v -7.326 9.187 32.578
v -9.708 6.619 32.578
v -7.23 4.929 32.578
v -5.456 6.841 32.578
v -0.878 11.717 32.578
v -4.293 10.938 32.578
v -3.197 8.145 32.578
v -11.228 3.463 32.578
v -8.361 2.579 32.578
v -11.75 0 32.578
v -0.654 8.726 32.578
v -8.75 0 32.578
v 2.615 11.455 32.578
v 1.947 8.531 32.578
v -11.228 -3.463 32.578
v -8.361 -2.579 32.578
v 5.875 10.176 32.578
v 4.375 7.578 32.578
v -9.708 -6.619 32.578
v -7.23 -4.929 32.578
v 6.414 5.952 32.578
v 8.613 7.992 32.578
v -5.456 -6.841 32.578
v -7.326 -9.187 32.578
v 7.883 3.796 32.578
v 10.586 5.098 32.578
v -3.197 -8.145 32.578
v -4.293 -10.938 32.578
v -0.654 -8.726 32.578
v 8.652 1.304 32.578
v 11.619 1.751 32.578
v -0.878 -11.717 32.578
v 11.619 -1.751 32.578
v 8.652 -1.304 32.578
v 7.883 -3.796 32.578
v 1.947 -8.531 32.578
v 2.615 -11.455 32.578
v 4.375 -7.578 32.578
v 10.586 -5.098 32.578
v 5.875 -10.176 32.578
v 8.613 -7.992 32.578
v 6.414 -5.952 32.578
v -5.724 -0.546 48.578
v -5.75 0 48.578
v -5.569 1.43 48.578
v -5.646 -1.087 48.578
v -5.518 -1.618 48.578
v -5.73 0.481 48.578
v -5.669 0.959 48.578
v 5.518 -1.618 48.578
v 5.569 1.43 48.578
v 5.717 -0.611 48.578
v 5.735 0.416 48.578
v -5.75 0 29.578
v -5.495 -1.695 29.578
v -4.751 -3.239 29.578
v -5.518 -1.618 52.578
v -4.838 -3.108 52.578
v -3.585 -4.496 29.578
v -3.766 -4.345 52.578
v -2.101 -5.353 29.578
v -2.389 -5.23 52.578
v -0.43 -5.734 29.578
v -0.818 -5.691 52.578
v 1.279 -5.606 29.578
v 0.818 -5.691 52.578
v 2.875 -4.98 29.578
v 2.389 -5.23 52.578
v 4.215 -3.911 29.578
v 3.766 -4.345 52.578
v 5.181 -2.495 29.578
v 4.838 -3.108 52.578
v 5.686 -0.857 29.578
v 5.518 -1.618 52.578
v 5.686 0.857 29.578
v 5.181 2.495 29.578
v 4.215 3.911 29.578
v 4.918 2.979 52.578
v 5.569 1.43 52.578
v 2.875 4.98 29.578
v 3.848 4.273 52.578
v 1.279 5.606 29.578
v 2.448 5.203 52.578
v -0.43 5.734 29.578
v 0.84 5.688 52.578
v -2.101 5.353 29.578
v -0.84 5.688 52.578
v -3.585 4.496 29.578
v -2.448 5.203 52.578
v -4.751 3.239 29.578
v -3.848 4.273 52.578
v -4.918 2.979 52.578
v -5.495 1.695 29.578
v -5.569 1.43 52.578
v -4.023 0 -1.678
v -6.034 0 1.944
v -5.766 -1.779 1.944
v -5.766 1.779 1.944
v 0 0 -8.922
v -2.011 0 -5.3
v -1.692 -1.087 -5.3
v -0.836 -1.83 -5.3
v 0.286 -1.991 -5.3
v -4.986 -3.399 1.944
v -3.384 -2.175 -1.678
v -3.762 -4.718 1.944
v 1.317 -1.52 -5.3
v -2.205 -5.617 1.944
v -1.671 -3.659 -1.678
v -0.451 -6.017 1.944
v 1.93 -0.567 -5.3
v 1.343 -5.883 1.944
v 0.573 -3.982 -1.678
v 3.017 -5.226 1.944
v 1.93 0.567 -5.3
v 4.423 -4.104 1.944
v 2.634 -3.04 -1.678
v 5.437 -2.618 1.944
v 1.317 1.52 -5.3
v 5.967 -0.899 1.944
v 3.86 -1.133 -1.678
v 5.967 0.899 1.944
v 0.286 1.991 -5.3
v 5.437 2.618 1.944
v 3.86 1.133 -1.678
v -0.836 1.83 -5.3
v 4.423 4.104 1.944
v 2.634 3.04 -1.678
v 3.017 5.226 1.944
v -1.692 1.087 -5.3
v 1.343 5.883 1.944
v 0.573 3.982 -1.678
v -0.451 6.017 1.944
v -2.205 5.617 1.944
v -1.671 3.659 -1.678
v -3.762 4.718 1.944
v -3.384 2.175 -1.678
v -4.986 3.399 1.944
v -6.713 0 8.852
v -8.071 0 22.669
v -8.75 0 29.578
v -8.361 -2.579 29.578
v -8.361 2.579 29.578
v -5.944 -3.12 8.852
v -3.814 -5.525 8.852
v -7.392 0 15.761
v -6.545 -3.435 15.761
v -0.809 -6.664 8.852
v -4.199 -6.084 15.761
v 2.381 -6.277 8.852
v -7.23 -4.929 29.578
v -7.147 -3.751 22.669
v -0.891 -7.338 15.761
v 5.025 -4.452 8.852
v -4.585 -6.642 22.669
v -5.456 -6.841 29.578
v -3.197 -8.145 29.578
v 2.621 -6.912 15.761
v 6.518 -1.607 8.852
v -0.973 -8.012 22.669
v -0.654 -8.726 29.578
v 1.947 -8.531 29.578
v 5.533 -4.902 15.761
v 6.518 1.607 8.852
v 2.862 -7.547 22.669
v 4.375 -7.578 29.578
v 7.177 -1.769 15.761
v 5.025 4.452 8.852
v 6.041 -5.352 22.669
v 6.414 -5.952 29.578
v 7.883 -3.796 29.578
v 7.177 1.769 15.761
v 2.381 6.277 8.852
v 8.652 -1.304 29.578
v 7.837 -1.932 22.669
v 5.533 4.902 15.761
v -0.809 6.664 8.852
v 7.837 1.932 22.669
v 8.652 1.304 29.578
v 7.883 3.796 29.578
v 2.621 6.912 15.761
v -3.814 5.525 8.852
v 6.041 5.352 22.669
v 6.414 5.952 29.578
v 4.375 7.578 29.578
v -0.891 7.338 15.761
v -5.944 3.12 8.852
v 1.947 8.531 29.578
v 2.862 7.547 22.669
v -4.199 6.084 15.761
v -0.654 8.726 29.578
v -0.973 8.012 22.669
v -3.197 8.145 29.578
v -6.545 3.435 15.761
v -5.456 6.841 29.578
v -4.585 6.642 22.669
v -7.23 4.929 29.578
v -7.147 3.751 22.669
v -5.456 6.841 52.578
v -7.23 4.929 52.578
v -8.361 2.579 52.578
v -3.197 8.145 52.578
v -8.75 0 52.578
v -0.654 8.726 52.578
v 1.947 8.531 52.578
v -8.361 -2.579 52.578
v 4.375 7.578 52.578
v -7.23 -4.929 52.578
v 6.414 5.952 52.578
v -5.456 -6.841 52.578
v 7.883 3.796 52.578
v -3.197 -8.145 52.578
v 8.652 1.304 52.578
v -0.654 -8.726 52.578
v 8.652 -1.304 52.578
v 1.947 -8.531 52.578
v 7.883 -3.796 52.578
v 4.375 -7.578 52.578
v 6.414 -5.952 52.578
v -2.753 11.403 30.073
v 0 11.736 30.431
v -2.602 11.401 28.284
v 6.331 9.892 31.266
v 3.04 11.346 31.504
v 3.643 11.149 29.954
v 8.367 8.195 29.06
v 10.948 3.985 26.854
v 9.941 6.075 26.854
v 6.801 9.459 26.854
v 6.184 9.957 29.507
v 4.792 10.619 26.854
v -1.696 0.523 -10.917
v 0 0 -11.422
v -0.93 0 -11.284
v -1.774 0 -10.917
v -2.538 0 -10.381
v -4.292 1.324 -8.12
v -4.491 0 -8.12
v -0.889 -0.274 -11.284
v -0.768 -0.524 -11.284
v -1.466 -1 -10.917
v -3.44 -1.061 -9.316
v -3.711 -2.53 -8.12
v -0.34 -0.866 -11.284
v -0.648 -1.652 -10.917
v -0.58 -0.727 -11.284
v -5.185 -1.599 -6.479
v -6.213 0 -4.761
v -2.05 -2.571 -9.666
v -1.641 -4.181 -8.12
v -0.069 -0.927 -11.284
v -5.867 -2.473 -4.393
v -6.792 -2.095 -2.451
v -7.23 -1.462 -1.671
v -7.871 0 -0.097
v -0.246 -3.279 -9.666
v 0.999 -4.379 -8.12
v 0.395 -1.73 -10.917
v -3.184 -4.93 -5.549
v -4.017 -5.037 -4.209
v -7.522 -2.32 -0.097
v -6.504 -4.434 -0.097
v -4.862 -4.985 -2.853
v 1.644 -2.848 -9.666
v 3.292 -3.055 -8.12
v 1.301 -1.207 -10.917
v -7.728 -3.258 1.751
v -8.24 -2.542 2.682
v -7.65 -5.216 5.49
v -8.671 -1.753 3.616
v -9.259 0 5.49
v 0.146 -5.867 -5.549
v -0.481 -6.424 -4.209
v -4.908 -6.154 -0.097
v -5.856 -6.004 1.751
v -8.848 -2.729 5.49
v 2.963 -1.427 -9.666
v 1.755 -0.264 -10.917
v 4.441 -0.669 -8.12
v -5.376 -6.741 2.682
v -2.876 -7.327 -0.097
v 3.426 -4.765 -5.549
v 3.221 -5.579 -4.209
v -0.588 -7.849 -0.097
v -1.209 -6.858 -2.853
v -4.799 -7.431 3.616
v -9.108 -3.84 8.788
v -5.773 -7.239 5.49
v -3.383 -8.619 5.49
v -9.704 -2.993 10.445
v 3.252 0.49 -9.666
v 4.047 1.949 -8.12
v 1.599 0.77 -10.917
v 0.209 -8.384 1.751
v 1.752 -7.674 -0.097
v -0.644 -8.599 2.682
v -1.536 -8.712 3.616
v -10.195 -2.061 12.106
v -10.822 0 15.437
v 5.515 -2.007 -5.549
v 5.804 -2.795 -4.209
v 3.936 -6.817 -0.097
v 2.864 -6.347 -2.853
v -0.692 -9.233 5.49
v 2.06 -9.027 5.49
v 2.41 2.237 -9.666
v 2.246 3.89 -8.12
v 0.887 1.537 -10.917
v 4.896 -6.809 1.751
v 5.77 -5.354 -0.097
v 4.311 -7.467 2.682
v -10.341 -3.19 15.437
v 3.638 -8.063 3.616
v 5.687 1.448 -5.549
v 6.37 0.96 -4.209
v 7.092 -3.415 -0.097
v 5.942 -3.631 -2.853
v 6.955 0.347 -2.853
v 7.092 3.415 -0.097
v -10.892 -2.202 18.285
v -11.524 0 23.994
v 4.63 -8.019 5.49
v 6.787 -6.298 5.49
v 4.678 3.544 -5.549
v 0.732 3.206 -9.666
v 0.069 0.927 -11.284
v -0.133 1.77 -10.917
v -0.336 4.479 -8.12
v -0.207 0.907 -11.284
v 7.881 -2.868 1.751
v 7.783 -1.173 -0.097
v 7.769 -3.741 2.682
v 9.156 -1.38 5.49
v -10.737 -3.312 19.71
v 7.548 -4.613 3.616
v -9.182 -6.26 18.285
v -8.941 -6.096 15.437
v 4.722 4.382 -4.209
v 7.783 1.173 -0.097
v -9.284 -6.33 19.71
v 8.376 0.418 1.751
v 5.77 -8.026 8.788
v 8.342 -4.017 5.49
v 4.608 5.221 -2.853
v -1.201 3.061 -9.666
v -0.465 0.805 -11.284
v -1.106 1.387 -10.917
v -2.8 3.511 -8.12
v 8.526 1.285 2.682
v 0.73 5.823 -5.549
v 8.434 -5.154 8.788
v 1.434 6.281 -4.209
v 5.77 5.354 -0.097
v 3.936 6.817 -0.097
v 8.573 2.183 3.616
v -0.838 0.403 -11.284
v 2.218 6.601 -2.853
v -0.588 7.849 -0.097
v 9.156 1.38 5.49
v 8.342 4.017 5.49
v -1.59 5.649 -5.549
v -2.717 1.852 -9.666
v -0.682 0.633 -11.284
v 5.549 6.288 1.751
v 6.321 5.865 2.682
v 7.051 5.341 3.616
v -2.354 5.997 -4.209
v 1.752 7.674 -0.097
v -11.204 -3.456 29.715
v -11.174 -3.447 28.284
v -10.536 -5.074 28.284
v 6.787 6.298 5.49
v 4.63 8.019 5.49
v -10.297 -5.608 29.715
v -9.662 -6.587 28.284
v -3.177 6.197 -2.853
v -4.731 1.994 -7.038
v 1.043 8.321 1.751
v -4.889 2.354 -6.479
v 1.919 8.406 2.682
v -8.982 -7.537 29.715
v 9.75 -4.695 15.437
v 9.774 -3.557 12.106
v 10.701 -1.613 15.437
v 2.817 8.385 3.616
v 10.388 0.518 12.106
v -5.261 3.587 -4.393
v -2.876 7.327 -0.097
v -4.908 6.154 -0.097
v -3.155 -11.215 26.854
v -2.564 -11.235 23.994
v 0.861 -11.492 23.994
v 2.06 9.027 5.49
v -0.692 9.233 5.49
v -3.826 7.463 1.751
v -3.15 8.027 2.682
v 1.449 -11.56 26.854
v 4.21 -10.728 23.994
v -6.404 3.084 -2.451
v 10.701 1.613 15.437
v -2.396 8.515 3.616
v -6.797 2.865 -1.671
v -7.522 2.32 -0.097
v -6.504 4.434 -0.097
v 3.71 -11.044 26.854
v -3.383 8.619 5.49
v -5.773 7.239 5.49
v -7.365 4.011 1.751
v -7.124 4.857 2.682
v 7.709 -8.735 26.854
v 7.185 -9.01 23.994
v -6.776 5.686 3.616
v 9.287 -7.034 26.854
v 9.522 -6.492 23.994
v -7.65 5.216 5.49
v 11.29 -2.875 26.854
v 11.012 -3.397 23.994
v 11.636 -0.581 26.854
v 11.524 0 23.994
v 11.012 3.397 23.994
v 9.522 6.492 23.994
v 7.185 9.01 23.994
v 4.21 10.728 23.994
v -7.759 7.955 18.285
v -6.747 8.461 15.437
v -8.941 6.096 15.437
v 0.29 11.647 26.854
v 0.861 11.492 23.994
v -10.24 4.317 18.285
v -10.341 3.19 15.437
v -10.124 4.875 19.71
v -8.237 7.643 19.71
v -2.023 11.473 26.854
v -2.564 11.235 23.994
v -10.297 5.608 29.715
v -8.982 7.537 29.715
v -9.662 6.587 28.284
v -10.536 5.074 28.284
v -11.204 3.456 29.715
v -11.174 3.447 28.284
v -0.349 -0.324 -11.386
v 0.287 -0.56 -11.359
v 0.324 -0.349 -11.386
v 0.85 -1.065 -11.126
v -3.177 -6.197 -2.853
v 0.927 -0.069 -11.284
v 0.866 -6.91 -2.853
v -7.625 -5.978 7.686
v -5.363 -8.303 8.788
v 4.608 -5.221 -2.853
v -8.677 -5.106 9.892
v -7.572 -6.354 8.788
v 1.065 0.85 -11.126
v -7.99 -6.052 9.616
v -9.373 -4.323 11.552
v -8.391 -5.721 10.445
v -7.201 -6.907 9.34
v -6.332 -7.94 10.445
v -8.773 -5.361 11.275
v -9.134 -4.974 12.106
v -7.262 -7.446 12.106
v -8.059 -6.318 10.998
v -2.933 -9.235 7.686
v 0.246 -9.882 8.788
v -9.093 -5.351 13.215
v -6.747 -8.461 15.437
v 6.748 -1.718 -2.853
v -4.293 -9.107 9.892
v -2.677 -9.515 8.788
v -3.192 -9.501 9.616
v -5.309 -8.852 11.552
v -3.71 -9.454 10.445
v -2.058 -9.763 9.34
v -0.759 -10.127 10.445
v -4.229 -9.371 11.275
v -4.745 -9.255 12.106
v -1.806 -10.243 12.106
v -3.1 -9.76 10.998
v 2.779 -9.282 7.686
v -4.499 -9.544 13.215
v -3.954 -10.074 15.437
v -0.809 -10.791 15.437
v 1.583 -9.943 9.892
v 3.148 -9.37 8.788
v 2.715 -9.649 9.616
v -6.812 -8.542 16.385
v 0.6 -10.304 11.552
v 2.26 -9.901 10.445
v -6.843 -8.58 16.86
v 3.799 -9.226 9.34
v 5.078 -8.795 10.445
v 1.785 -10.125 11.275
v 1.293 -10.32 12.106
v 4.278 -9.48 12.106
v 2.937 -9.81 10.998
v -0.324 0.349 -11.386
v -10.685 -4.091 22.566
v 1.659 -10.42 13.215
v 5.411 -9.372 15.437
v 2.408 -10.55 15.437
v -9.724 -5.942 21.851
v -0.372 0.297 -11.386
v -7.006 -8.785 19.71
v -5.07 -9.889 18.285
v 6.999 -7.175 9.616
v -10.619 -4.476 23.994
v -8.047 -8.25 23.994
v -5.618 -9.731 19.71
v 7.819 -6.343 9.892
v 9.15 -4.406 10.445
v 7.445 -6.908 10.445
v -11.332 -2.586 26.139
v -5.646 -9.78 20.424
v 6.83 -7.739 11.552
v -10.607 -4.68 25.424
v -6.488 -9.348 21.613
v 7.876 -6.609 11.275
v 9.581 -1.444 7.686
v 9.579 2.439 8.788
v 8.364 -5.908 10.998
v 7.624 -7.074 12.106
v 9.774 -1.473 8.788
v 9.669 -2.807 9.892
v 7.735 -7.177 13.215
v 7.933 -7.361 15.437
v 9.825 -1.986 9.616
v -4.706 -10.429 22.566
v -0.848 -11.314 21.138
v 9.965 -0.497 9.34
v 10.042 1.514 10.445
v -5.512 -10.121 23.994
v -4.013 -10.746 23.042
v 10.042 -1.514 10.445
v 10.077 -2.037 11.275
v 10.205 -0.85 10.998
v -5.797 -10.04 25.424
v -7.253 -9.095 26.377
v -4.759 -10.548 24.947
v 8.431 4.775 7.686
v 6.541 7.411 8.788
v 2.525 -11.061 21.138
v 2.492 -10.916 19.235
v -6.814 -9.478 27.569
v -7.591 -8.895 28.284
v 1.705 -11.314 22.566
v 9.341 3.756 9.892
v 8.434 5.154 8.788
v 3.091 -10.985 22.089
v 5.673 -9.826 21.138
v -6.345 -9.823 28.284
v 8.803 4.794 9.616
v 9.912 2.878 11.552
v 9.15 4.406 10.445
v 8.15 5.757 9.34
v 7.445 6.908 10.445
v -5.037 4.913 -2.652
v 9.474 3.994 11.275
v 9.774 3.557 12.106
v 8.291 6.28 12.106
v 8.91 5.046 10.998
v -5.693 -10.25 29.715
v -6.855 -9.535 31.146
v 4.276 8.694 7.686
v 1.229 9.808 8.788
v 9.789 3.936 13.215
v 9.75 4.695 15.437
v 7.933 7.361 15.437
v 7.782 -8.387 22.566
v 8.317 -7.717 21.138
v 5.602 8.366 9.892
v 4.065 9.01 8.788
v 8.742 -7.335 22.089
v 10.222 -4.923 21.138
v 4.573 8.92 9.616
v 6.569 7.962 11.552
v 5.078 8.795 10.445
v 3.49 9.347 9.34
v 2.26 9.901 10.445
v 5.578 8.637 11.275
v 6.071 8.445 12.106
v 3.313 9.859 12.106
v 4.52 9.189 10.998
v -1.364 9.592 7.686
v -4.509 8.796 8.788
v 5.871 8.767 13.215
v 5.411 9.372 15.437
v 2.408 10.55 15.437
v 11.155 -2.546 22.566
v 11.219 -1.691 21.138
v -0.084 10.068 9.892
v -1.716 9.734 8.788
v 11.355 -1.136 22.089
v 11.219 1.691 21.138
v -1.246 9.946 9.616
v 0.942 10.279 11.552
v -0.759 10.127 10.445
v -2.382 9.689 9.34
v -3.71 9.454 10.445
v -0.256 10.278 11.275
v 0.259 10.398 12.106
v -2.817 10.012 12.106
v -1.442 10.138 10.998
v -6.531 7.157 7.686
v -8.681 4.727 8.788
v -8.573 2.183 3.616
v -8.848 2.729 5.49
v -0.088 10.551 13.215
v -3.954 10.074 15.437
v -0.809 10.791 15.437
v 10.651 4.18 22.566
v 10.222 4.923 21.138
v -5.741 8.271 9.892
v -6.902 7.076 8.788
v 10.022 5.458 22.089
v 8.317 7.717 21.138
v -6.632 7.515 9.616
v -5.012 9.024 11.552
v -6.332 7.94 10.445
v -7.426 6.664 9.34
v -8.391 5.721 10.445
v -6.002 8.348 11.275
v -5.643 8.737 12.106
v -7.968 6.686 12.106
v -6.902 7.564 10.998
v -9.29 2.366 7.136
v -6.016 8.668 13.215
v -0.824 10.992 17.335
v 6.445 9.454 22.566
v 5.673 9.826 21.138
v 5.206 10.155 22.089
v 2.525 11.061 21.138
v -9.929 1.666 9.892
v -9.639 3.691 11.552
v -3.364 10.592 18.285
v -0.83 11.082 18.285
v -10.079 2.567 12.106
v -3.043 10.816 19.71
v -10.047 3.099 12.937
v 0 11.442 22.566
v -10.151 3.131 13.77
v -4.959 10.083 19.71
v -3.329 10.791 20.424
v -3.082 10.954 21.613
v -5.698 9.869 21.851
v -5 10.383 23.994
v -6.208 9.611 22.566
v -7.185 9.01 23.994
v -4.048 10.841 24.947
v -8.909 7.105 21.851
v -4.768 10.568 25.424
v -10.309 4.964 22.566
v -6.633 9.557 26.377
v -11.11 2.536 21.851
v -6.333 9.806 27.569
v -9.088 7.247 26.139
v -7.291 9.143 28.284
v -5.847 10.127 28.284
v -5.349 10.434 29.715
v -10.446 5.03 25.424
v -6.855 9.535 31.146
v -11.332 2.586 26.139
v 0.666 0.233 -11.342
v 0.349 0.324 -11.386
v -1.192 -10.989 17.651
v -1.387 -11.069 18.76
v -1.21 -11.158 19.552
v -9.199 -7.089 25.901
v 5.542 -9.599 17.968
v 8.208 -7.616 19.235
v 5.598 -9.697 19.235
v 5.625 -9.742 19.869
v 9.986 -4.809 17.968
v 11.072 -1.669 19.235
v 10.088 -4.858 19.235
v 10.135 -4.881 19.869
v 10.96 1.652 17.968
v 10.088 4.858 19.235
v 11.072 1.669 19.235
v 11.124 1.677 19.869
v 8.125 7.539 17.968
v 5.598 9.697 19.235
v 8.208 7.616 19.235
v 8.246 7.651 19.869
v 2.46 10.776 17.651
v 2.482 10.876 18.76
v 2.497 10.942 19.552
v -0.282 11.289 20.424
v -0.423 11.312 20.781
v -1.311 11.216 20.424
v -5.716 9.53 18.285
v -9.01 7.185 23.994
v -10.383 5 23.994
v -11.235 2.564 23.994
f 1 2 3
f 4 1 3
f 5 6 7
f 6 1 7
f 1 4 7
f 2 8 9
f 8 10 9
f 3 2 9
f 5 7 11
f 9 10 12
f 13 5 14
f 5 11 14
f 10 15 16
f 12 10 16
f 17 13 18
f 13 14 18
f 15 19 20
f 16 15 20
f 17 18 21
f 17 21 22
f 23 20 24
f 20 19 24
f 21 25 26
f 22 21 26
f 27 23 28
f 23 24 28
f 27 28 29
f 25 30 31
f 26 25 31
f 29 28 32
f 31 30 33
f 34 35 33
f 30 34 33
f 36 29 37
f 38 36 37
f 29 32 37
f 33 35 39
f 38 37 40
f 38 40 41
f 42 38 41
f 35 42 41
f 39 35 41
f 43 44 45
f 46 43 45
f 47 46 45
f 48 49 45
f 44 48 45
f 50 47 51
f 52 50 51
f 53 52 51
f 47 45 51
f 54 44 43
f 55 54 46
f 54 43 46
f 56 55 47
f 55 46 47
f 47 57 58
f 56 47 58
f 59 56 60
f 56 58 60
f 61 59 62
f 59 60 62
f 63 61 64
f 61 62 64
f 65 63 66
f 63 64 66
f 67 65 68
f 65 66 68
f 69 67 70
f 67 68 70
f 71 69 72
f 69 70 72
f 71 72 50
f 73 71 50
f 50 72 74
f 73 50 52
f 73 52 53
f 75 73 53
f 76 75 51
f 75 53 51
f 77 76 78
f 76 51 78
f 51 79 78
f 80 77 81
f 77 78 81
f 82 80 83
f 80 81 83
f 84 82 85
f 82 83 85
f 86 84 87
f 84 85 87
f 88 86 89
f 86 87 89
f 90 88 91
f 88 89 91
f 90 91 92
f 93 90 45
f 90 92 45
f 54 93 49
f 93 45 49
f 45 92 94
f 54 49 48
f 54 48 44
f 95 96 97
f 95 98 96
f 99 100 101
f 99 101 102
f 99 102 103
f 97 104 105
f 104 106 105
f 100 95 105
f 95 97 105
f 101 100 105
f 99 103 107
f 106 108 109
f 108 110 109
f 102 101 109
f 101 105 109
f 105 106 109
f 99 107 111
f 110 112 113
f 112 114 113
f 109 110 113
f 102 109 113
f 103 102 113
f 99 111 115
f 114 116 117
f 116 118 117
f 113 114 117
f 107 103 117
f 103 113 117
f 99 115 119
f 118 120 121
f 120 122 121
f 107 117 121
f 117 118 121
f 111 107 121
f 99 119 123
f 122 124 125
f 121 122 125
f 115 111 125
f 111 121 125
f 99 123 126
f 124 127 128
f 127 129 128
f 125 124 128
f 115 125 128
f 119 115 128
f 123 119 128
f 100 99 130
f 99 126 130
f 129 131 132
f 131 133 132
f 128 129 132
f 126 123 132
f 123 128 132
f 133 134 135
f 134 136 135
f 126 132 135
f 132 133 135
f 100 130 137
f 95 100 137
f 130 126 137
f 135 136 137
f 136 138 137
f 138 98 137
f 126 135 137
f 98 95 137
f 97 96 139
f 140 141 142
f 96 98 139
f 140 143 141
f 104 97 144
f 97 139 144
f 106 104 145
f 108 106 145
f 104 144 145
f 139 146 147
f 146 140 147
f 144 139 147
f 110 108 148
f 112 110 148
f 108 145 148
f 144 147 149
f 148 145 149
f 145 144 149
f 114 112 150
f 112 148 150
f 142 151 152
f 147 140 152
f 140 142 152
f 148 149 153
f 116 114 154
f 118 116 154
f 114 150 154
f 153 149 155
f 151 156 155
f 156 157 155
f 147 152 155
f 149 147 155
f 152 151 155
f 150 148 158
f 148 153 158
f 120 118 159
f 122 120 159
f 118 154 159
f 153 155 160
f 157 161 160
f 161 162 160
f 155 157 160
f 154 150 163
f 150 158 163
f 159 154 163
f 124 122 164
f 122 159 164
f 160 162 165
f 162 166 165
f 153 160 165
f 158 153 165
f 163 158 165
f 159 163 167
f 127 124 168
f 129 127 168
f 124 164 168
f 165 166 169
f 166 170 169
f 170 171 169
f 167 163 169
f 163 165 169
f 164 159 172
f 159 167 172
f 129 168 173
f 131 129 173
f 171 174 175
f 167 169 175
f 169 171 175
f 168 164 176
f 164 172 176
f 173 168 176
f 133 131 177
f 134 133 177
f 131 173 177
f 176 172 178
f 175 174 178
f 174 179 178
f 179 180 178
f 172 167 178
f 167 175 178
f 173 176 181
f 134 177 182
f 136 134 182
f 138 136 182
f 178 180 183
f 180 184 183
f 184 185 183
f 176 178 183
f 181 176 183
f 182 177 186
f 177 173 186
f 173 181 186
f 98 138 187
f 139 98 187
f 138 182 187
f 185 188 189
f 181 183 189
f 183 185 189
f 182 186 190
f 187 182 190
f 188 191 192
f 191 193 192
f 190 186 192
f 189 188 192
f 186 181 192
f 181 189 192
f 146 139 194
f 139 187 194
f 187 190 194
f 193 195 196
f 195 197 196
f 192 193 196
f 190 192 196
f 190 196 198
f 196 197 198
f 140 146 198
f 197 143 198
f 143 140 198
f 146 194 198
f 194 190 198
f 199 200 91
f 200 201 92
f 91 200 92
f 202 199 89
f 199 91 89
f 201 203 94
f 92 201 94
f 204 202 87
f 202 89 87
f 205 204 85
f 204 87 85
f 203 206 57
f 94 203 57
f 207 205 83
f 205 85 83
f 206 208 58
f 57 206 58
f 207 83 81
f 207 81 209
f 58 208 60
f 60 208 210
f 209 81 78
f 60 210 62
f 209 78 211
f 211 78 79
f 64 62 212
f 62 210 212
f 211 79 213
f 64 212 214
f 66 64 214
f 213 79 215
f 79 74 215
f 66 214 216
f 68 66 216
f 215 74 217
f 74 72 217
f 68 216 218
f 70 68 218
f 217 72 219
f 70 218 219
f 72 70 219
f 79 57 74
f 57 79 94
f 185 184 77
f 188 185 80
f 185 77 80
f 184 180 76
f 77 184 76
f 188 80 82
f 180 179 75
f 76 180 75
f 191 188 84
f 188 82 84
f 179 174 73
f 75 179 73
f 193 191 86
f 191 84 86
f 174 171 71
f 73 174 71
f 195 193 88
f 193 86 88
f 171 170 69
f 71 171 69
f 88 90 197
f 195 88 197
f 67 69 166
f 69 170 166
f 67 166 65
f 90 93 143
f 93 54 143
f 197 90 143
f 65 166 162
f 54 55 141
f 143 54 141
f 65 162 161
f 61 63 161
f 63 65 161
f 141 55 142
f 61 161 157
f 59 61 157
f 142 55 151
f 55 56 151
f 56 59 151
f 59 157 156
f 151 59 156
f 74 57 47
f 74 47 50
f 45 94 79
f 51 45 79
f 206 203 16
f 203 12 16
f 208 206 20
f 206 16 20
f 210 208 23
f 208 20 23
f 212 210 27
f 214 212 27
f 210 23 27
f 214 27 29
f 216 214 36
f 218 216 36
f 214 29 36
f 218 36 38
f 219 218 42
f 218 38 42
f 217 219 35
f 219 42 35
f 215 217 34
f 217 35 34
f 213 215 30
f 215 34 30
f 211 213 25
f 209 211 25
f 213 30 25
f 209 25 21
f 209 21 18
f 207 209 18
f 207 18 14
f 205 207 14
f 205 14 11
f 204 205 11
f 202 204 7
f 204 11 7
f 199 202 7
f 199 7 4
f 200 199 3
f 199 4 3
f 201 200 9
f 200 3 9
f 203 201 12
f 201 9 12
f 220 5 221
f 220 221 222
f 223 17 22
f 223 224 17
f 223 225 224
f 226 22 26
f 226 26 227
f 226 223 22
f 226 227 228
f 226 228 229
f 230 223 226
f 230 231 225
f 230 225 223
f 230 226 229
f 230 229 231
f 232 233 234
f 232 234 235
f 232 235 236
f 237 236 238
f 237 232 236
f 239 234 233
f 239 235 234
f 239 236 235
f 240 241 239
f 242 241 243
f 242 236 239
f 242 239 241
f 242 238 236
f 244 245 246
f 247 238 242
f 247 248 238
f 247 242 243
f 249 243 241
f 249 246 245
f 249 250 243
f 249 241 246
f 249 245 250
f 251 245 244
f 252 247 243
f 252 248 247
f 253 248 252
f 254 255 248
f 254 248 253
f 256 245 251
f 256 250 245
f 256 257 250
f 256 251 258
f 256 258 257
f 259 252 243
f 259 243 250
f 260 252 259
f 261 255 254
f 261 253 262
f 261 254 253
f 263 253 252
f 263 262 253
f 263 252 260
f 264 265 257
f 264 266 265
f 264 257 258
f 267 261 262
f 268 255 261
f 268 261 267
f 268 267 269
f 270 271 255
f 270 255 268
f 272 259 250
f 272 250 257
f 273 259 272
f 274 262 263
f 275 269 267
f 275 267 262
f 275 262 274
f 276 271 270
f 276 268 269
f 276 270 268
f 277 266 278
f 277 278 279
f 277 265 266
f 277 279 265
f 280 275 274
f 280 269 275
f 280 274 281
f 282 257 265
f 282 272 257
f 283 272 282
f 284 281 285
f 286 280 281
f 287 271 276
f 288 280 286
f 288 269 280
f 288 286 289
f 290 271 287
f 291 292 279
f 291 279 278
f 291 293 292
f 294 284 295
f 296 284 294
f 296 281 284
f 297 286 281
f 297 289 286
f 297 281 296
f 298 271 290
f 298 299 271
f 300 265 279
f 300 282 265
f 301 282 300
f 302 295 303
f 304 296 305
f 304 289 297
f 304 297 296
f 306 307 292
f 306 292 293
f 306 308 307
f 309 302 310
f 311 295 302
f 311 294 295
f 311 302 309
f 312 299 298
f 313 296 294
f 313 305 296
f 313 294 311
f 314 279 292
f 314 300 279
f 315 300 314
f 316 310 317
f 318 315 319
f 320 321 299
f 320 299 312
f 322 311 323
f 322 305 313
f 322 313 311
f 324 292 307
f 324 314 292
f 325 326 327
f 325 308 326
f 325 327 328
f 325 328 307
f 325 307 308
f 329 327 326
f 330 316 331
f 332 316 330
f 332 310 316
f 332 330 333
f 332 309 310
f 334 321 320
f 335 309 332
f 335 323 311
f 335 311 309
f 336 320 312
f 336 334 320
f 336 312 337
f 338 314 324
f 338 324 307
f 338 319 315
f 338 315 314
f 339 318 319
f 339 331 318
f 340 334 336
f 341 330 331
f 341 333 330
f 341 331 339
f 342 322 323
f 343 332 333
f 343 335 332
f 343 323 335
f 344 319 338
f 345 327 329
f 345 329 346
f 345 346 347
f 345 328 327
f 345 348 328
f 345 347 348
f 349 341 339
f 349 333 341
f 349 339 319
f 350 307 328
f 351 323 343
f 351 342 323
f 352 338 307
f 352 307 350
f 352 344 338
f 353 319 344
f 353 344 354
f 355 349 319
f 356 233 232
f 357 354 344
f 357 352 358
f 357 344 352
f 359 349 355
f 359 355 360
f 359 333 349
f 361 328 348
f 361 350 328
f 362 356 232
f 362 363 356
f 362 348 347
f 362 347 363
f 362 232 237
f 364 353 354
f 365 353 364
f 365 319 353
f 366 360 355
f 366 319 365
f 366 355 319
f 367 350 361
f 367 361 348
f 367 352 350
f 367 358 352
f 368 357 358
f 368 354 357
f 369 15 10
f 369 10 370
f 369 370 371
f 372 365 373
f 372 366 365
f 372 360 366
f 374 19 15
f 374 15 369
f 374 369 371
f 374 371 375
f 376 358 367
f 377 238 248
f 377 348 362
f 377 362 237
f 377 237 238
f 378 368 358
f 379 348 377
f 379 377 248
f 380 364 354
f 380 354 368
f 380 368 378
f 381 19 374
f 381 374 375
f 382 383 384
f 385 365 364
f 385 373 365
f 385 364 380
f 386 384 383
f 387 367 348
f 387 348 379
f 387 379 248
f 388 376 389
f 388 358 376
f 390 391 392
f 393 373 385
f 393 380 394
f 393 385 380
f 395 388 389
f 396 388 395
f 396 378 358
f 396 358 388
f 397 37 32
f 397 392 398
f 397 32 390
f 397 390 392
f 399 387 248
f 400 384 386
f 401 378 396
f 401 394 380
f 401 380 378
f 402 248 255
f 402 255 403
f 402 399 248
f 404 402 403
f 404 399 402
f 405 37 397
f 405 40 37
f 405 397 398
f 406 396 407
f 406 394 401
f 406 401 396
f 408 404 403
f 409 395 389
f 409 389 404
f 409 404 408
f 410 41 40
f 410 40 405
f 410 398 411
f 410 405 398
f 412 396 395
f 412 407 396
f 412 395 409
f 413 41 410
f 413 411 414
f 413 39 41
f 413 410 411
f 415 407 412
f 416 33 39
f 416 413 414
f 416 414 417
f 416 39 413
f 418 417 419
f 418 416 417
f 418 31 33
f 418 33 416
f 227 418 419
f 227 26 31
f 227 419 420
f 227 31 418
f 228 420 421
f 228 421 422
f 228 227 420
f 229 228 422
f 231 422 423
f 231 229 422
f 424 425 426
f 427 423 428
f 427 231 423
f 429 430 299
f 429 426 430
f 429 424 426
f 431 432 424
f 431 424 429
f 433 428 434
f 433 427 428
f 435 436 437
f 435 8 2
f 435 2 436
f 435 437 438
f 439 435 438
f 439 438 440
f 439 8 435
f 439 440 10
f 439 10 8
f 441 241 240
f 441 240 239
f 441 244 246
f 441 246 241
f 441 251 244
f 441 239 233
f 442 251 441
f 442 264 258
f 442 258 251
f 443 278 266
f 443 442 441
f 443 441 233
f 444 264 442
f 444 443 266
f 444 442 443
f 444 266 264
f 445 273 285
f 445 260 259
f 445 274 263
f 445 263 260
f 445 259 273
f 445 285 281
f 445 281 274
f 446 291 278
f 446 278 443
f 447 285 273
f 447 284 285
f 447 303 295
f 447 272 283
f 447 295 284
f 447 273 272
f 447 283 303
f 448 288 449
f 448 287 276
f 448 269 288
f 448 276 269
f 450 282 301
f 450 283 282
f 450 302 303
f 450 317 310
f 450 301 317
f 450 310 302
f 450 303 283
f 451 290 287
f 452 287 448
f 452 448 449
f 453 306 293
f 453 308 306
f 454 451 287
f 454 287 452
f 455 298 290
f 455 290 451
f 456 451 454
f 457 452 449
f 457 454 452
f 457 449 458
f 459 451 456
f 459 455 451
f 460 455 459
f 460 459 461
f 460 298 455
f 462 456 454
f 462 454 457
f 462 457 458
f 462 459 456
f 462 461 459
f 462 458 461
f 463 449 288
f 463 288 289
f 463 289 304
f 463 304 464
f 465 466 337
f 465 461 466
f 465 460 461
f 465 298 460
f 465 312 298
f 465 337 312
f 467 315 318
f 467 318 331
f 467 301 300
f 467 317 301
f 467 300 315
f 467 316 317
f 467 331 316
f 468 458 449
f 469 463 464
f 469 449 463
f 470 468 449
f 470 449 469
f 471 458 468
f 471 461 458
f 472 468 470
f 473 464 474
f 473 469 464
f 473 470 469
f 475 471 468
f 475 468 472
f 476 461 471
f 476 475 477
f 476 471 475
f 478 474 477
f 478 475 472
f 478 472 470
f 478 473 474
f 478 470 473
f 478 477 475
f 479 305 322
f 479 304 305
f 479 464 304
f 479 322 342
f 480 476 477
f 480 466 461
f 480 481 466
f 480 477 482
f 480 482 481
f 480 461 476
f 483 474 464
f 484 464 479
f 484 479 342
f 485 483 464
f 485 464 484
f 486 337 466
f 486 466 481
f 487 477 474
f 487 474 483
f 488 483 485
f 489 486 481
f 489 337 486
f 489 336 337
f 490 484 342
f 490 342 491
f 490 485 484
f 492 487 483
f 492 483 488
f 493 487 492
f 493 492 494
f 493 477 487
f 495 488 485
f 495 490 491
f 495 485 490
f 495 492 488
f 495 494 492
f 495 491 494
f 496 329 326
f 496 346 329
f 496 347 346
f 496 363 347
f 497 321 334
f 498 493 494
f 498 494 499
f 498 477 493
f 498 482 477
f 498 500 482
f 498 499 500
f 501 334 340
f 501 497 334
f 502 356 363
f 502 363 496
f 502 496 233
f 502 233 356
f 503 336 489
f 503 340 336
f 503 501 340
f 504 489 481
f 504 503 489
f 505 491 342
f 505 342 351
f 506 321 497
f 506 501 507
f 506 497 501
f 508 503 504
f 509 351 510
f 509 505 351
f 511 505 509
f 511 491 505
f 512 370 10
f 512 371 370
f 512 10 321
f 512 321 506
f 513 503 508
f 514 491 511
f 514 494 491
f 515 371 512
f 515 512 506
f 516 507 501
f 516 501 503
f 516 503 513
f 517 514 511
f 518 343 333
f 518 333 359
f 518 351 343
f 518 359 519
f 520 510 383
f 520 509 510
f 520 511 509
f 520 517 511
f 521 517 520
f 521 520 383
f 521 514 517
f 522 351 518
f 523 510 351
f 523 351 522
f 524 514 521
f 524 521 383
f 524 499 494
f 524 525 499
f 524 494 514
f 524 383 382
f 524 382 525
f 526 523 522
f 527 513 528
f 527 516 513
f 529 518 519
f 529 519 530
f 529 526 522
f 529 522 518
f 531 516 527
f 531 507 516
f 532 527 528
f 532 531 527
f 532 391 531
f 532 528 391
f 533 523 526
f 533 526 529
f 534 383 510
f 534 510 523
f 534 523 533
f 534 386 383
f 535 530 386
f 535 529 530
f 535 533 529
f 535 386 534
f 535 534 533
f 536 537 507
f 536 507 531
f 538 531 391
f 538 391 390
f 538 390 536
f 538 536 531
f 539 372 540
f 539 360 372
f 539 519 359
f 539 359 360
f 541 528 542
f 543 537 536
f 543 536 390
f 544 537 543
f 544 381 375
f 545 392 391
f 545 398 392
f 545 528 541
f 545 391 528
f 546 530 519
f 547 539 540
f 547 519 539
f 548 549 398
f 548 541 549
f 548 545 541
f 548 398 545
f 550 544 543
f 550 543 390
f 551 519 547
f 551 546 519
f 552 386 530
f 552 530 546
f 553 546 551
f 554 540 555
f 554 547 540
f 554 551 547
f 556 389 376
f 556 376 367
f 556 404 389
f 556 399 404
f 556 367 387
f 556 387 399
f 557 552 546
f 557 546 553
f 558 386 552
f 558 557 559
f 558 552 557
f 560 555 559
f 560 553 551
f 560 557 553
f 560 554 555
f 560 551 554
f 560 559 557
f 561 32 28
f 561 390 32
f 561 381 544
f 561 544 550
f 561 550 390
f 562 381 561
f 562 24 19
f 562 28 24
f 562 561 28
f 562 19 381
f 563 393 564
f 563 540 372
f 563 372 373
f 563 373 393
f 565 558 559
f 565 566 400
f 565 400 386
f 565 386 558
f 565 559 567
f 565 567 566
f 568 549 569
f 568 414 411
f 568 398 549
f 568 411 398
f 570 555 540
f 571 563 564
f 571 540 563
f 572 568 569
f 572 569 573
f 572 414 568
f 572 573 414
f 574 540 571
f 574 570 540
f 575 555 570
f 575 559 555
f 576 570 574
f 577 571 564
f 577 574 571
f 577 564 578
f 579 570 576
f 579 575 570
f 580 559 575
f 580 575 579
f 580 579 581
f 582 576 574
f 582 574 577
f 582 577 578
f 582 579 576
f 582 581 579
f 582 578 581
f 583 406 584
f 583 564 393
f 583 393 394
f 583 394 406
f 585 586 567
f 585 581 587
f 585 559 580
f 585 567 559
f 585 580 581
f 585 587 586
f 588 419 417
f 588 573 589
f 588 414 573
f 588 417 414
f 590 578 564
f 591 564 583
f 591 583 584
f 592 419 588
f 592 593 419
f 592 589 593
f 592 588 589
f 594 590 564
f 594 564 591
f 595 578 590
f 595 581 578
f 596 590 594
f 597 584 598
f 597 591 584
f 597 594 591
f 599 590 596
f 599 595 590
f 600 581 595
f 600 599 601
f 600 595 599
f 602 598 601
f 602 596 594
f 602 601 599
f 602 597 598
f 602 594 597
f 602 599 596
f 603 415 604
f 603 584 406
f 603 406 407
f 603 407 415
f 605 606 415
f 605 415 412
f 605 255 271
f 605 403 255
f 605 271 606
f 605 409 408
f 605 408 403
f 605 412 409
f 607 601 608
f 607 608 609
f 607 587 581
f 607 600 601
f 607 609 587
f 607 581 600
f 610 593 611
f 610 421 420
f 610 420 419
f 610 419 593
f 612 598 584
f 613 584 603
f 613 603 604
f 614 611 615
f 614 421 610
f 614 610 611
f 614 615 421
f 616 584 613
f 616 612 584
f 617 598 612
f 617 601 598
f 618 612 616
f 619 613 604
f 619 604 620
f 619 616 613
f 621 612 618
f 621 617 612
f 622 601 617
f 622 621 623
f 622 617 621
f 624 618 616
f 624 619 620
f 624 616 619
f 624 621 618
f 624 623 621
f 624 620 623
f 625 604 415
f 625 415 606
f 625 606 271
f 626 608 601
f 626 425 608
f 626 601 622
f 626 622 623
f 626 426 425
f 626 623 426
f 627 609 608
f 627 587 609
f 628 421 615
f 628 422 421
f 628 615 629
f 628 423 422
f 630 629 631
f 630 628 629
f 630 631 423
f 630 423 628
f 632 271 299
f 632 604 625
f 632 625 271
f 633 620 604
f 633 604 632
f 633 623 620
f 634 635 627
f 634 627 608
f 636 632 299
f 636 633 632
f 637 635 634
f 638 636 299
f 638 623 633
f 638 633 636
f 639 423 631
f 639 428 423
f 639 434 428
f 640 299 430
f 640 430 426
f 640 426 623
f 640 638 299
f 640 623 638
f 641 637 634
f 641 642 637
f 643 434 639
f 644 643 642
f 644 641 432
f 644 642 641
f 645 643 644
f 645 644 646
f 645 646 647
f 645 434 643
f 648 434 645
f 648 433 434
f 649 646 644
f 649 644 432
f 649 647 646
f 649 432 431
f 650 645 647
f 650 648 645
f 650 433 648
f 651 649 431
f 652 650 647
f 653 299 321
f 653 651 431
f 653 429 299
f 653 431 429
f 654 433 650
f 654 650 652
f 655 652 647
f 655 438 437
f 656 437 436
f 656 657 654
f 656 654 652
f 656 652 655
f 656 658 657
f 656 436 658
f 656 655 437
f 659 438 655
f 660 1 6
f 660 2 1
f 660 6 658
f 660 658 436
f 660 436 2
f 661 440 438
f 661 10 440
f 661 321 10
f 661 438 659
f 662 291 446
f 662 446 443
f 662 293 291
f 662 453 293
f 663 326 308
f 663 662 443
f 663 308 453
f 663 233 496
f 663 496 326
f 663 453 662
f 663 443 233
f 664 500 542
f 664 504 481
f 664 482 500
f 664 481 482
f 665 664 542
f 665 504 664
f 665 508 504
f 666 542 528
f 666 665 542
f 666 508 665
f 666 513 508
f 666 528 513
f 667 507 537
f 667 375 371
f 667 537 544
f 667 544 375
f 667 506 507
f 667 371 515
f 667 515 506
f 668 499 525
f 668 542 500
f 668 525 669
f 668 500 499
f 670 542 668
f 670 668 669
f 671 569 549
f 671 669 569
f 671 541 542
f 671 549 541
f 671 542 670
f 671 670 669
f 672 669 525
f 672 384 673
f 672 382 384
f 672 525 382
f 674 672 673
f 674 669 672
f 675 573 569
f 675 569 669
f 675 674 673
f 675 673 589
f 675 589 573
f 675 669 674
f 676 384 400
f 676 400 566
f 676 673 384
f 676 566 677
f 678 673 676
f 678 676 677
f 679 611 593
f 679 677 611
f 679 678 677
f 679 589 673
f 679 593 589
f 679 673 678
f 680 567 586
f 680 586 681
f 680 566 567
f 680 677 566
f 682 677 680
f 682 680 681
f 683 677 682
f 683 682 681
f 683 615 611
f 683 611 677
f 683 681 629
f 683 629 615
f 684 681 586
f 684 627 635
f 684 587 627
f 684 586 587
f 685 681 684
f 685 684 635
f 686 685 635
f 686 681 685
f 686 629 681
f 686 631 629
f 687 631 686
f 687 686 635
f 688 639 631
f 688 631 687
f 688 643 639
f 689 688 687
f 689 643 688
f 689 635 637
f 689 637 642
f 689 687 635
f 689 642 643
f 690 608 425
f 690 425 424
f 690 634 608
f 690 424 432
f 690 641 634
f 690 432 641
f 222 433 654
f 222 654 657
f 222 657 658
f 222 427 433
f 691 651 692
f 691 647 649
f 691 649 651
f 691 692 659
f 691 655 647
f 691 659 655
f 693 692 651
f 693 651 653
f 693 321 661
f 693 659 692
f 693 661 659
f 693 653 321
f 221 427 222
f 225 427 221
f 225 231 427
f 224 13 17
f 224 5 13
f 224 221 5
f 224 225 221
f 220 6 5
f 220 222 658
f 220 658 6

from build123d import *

# Parameters (mm, degrees)
SKETCH3_W           = 13.167666735
SKETCH3_H           = 3.048361989
BOSS_EXTRUDE7_DEPTH = 4


with BuildPart() as part:
    # Sketch1 → Revolve1 (revolve)
    with BuildSketch(Plane(origin=(0, 0, 0), x_dir=(1, 0, 0), z_dir=(0, 1, 0))):
        with BuildLine():
            Line((0, 11.422413793), (0, 8.922413793))
            Line((0, 8.922413793), (-6.034260666, -1.943584812))
            Line((-6.034260666, -1.943584812), (-8.75, -29.577586207))
            Line((-8.75, -29.577586207), (-5.75, -29.577586207))
            Line((-5.75, -29.577586207), (-5.75, -52.577586207))
            Line((-5.75, -52.577586207), (-8.75, -52.577586207))
            Line((-8.75, -52.577586207), (-8.75, -32.577586207))
            Line((-8.75, -32.577586207), (-11.75, -32.577586207))
            add(Edge.make_bspline(
                [(0, 11.422413793), (-1.278423588, 11.417026245), (-3.873144244, 9.558695327), (-5.944786969, 5.627242402), (-7.710873625, 0.905910608), (-8.885618359, -3.570284013), (-9.891395845, -8.594561629), (-10.670483225, -13.791762741), (-11.219012774, -19.122009095), (-11.530237696, -23.790668903), (-11.707521388, -28.093294524), (-11.749966177, -30.922446964), (-11.75, -32.577586207)],
                knots=[0, 0, 0, 0, 0.077095745, 0.191082865, 0.27602247, 0.396033744, 0.482752955, 0.599802605, 0.727919369, 0.821235279, 0.895416594, 1, 1, 1, 1], degree=3))
        make_face()
    revolve(axis=Axis((0, 0, -11.422413793), (0, 0, 1)))

    # Sketch3 → Boss-Extrude7 (add)
    with BuildSketch(Plane.XY.offset(52.577586207)):
        with Locations((0.047139619, -0.094279236)):
            Rectangle(SKETCH3_W, SKETCH3_H)
    extrude(amount=-BOSS_EXTRUDE7_DEPTH)


solid = part.part
